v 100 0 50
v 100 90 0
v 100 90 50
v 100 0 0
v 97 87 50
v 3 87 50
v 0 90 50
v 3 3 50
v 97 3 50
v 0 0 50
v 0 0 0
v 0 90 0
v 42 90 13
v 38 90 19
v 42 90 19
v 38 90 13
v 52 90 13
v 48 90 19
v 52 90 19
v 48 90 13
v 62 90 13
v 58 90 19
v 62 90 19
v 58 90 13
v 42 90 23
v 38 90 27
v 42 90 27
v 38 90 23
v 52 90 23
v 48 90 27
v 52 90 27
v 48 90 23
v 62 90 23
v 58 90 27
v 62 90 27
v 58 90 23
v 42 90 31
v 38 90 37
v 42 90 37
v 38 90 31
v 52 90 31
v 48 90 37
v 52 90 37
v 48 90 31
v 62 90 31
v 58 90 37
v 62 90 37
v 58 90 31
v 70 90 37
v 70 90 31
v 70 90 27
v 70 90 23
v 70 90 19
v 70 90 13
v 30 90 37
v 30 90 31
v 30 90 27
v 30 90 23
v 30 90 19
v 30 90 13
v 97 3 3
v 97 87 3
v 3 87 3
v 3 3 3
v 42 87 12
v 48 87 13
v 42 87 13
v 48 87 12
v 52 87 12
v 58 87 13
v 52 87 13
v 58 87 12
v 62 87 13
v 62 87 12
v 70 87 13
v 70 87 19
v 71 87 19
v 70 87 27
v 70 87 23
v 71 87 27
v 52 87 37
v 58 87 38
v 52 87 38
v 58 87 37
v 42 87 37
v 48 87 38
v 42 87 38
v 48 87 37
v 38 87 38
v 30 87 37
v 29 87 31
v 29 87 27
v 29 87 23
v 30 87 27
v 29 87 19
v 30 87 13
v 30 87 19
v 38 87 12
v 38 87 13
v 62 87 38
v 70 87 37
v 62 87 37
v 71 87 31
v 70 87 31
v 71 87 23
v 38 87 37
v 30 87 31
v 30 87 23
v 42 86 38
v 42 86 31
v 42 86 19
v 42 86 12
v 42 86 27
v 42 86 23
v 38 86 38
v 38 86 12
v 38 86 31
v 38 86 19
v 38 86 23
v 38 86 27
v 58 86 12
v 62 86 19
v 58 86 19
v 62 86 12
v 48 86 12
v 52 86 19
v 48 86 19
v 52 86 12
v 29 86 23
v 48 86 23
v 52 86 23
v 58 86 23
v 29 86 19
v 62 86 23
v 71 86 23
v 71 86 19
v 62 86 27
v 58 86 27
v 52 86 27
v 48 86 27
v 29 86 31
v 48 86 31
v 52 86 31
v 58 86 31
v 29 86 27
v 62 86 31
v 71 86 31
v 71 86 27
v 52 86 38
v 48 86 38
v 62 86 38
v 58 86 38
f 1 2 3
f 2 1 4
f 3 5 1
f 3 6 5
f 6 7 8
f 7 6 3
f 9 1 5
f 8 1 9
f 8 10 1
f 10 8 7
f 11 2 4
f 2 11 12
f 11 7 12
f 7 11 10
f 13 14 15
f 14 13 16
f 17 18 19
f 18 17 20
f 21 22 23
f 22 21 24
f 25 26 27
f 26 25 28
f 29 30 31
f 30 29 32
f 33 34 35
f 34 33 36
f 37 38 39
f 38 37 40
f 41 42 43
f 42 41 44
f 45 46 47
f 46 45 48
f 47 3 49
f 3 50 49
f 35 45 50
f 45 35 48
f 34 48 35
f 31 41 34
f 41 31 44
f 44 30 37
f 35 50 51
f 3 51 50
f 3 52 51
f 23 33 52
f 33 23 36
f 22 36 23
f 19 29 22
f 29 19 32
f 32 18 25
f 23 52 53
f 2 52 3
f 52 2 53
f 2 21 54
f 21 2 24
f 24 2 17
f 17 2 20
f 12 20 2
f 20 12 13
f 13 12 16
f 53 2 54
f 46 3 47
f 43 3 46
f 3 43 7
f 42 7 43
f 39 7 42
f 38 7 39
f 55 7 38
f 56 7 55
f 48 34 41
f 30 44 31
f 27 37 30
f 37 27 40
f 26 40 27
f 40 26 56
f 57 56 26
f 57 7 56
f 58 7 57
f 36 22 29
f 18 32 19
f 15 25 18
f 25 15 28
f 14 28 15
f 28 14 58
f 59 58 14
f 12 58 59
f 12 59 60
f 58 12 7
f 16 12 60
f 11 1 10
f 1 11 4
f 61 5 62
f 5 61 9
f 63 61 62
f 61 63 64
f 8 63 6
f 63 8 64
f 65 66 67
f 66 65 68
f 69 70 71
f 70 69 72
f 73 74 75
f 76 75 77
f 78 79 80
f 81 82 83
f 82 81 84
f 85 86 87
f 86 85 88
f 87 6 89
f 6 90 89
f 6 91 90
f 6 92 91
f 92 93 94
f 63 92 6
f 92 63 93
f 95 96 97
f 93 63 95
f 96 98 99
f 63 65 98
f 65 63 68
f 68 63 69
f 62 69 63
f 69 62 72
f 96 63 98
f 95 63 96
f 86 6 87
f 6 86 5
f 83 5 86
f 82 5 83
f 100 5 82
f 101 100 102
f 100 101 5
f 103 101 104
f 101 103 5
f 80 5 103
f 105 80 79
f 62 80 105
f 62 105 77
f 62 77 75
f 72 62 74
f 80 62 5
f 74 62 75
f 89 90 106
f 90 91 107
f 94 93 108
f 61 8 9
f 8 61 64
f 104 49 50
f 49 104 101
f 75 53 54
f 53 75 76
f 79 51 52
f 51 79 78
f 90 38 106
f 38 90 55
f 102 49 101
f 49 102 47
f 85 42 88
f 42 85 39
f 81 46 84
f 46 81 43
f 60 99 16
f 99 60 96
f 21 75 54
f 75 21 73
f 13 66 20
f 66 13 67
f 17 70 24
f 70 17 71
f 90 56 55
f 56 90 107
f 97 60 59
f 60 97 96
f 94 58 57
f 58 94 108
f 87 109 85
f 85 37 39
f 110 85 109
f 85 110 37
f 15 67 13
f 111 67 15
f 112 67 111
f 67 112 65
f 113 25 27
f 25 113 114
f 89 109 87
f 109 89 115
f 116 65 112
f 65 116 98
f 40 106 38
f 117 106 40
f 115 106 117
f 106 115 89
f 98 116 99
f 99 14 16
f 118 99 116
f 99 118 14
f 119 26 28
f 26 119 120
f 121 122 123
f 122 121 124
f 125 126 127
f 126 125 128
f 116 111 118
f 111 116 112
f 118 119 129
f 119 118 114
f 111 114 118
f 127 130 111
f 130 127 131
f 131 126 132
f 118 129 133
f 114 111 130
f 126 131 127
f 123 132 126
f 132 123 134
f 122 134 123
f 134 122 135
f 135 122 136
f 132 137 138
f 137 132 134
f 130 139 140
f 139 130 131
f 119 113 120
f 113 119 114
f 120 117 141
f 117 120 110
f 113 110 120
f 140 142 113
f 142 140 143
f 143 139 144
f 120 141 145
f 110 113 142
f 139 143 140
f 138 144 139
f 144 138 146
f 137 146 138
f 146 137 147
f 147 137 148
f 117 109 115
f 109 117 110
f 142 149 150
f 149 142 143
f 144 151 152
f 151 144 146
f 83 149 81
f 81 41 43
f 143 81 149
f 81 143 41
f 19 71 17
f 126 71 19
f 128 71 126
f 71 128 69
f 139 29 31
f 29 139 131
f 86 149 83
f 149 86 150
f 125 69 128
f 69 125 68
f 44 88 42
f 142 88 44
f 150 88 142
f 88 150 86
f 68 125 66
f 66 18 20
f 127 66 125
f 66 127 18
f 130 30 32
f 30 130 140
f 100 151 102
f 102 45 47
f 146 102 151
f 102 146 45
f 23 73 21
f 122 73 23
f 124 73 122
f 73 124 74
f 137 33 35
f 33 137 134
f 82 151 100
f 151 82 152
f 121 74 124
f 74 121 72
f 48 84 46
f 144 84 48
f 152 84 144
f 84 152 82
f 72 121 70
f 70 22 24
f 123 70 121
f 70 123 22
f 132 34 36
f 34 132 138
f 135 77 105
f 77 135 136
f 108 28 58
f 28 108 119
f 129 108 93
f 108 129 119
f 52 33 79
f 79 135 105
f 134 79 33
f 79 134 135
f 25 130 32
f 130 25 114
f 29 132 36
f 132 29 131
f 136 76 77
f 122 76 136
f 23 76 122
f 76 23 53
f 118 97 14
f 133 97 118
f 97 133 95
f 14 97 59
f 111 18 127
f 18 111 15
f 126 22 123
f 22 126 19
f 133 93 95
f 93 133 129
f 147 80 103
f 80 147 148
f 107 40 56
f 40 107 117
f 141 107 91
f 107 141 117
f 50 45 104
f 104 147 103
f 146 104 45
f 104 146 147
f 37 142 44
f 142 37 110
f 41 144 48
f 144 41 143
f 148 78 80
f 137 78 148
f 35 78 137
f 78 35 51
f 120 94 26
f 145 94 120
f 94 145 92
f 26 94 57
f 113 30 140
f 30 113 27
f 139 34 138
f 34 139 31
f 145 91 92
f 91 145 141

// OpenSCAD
$fn = 32;

// ----------------------------------------------------------------------
// Vent box: crossgrid enclosure
// ----------------------------------------------------------------------

// --- parameters (mm) ---
box_l = 100;              // box length, X
box_w = 90;               // box width, Y
box_h = 50;               // box height, Z
wall_t = 3;               // shell wall thickness
win_l = 40;               // vent window width, X
win_h = 24;               // vent window height, Z
bar_w = 4;                // grid bar width
n_v = 3;                  // vertical bar count
n_h = 2;                  // horizontal bar count

win_z0 = (box_h - win_h) / 2;  // window lower edge Z
v_step = win_l / (n_v + 1);  // vertical bar step
h_step = win_h / (n_h + 1);  // horizontal bar step

difference() {
  union() {
    difference() {
      cube([box_l, box_w, box_h]);
  translate([wall_t, wall_t, wall_t])
    cube([box_l - 2 * wall_t, box_w - 2 * wall_t, box_h]);
  translate([(box_l - win_l) / 2, box_w - wall_t - 1, win_z0])
    cube([win_l, wall_t + 2, win_h]);
    }
    for (i = [1 : n_v])
      translate([(box_l - win_l) / 2 + i * v_step - bar_w / 2,
                 box_w - wall_t - 1, win_z0 - 1])
        cube([bar_w, wall_t + 1, win_h + 2]);
    for (i = [1 : n_h])
      translate([(box_l - win_l) / 2 - 1, box_w - wall_t - 1,
                 win_z0 + i * h_step - bar_w / 2])
        cube([win_l + 2, wall_t + 1, bar_w]);
  }
}
